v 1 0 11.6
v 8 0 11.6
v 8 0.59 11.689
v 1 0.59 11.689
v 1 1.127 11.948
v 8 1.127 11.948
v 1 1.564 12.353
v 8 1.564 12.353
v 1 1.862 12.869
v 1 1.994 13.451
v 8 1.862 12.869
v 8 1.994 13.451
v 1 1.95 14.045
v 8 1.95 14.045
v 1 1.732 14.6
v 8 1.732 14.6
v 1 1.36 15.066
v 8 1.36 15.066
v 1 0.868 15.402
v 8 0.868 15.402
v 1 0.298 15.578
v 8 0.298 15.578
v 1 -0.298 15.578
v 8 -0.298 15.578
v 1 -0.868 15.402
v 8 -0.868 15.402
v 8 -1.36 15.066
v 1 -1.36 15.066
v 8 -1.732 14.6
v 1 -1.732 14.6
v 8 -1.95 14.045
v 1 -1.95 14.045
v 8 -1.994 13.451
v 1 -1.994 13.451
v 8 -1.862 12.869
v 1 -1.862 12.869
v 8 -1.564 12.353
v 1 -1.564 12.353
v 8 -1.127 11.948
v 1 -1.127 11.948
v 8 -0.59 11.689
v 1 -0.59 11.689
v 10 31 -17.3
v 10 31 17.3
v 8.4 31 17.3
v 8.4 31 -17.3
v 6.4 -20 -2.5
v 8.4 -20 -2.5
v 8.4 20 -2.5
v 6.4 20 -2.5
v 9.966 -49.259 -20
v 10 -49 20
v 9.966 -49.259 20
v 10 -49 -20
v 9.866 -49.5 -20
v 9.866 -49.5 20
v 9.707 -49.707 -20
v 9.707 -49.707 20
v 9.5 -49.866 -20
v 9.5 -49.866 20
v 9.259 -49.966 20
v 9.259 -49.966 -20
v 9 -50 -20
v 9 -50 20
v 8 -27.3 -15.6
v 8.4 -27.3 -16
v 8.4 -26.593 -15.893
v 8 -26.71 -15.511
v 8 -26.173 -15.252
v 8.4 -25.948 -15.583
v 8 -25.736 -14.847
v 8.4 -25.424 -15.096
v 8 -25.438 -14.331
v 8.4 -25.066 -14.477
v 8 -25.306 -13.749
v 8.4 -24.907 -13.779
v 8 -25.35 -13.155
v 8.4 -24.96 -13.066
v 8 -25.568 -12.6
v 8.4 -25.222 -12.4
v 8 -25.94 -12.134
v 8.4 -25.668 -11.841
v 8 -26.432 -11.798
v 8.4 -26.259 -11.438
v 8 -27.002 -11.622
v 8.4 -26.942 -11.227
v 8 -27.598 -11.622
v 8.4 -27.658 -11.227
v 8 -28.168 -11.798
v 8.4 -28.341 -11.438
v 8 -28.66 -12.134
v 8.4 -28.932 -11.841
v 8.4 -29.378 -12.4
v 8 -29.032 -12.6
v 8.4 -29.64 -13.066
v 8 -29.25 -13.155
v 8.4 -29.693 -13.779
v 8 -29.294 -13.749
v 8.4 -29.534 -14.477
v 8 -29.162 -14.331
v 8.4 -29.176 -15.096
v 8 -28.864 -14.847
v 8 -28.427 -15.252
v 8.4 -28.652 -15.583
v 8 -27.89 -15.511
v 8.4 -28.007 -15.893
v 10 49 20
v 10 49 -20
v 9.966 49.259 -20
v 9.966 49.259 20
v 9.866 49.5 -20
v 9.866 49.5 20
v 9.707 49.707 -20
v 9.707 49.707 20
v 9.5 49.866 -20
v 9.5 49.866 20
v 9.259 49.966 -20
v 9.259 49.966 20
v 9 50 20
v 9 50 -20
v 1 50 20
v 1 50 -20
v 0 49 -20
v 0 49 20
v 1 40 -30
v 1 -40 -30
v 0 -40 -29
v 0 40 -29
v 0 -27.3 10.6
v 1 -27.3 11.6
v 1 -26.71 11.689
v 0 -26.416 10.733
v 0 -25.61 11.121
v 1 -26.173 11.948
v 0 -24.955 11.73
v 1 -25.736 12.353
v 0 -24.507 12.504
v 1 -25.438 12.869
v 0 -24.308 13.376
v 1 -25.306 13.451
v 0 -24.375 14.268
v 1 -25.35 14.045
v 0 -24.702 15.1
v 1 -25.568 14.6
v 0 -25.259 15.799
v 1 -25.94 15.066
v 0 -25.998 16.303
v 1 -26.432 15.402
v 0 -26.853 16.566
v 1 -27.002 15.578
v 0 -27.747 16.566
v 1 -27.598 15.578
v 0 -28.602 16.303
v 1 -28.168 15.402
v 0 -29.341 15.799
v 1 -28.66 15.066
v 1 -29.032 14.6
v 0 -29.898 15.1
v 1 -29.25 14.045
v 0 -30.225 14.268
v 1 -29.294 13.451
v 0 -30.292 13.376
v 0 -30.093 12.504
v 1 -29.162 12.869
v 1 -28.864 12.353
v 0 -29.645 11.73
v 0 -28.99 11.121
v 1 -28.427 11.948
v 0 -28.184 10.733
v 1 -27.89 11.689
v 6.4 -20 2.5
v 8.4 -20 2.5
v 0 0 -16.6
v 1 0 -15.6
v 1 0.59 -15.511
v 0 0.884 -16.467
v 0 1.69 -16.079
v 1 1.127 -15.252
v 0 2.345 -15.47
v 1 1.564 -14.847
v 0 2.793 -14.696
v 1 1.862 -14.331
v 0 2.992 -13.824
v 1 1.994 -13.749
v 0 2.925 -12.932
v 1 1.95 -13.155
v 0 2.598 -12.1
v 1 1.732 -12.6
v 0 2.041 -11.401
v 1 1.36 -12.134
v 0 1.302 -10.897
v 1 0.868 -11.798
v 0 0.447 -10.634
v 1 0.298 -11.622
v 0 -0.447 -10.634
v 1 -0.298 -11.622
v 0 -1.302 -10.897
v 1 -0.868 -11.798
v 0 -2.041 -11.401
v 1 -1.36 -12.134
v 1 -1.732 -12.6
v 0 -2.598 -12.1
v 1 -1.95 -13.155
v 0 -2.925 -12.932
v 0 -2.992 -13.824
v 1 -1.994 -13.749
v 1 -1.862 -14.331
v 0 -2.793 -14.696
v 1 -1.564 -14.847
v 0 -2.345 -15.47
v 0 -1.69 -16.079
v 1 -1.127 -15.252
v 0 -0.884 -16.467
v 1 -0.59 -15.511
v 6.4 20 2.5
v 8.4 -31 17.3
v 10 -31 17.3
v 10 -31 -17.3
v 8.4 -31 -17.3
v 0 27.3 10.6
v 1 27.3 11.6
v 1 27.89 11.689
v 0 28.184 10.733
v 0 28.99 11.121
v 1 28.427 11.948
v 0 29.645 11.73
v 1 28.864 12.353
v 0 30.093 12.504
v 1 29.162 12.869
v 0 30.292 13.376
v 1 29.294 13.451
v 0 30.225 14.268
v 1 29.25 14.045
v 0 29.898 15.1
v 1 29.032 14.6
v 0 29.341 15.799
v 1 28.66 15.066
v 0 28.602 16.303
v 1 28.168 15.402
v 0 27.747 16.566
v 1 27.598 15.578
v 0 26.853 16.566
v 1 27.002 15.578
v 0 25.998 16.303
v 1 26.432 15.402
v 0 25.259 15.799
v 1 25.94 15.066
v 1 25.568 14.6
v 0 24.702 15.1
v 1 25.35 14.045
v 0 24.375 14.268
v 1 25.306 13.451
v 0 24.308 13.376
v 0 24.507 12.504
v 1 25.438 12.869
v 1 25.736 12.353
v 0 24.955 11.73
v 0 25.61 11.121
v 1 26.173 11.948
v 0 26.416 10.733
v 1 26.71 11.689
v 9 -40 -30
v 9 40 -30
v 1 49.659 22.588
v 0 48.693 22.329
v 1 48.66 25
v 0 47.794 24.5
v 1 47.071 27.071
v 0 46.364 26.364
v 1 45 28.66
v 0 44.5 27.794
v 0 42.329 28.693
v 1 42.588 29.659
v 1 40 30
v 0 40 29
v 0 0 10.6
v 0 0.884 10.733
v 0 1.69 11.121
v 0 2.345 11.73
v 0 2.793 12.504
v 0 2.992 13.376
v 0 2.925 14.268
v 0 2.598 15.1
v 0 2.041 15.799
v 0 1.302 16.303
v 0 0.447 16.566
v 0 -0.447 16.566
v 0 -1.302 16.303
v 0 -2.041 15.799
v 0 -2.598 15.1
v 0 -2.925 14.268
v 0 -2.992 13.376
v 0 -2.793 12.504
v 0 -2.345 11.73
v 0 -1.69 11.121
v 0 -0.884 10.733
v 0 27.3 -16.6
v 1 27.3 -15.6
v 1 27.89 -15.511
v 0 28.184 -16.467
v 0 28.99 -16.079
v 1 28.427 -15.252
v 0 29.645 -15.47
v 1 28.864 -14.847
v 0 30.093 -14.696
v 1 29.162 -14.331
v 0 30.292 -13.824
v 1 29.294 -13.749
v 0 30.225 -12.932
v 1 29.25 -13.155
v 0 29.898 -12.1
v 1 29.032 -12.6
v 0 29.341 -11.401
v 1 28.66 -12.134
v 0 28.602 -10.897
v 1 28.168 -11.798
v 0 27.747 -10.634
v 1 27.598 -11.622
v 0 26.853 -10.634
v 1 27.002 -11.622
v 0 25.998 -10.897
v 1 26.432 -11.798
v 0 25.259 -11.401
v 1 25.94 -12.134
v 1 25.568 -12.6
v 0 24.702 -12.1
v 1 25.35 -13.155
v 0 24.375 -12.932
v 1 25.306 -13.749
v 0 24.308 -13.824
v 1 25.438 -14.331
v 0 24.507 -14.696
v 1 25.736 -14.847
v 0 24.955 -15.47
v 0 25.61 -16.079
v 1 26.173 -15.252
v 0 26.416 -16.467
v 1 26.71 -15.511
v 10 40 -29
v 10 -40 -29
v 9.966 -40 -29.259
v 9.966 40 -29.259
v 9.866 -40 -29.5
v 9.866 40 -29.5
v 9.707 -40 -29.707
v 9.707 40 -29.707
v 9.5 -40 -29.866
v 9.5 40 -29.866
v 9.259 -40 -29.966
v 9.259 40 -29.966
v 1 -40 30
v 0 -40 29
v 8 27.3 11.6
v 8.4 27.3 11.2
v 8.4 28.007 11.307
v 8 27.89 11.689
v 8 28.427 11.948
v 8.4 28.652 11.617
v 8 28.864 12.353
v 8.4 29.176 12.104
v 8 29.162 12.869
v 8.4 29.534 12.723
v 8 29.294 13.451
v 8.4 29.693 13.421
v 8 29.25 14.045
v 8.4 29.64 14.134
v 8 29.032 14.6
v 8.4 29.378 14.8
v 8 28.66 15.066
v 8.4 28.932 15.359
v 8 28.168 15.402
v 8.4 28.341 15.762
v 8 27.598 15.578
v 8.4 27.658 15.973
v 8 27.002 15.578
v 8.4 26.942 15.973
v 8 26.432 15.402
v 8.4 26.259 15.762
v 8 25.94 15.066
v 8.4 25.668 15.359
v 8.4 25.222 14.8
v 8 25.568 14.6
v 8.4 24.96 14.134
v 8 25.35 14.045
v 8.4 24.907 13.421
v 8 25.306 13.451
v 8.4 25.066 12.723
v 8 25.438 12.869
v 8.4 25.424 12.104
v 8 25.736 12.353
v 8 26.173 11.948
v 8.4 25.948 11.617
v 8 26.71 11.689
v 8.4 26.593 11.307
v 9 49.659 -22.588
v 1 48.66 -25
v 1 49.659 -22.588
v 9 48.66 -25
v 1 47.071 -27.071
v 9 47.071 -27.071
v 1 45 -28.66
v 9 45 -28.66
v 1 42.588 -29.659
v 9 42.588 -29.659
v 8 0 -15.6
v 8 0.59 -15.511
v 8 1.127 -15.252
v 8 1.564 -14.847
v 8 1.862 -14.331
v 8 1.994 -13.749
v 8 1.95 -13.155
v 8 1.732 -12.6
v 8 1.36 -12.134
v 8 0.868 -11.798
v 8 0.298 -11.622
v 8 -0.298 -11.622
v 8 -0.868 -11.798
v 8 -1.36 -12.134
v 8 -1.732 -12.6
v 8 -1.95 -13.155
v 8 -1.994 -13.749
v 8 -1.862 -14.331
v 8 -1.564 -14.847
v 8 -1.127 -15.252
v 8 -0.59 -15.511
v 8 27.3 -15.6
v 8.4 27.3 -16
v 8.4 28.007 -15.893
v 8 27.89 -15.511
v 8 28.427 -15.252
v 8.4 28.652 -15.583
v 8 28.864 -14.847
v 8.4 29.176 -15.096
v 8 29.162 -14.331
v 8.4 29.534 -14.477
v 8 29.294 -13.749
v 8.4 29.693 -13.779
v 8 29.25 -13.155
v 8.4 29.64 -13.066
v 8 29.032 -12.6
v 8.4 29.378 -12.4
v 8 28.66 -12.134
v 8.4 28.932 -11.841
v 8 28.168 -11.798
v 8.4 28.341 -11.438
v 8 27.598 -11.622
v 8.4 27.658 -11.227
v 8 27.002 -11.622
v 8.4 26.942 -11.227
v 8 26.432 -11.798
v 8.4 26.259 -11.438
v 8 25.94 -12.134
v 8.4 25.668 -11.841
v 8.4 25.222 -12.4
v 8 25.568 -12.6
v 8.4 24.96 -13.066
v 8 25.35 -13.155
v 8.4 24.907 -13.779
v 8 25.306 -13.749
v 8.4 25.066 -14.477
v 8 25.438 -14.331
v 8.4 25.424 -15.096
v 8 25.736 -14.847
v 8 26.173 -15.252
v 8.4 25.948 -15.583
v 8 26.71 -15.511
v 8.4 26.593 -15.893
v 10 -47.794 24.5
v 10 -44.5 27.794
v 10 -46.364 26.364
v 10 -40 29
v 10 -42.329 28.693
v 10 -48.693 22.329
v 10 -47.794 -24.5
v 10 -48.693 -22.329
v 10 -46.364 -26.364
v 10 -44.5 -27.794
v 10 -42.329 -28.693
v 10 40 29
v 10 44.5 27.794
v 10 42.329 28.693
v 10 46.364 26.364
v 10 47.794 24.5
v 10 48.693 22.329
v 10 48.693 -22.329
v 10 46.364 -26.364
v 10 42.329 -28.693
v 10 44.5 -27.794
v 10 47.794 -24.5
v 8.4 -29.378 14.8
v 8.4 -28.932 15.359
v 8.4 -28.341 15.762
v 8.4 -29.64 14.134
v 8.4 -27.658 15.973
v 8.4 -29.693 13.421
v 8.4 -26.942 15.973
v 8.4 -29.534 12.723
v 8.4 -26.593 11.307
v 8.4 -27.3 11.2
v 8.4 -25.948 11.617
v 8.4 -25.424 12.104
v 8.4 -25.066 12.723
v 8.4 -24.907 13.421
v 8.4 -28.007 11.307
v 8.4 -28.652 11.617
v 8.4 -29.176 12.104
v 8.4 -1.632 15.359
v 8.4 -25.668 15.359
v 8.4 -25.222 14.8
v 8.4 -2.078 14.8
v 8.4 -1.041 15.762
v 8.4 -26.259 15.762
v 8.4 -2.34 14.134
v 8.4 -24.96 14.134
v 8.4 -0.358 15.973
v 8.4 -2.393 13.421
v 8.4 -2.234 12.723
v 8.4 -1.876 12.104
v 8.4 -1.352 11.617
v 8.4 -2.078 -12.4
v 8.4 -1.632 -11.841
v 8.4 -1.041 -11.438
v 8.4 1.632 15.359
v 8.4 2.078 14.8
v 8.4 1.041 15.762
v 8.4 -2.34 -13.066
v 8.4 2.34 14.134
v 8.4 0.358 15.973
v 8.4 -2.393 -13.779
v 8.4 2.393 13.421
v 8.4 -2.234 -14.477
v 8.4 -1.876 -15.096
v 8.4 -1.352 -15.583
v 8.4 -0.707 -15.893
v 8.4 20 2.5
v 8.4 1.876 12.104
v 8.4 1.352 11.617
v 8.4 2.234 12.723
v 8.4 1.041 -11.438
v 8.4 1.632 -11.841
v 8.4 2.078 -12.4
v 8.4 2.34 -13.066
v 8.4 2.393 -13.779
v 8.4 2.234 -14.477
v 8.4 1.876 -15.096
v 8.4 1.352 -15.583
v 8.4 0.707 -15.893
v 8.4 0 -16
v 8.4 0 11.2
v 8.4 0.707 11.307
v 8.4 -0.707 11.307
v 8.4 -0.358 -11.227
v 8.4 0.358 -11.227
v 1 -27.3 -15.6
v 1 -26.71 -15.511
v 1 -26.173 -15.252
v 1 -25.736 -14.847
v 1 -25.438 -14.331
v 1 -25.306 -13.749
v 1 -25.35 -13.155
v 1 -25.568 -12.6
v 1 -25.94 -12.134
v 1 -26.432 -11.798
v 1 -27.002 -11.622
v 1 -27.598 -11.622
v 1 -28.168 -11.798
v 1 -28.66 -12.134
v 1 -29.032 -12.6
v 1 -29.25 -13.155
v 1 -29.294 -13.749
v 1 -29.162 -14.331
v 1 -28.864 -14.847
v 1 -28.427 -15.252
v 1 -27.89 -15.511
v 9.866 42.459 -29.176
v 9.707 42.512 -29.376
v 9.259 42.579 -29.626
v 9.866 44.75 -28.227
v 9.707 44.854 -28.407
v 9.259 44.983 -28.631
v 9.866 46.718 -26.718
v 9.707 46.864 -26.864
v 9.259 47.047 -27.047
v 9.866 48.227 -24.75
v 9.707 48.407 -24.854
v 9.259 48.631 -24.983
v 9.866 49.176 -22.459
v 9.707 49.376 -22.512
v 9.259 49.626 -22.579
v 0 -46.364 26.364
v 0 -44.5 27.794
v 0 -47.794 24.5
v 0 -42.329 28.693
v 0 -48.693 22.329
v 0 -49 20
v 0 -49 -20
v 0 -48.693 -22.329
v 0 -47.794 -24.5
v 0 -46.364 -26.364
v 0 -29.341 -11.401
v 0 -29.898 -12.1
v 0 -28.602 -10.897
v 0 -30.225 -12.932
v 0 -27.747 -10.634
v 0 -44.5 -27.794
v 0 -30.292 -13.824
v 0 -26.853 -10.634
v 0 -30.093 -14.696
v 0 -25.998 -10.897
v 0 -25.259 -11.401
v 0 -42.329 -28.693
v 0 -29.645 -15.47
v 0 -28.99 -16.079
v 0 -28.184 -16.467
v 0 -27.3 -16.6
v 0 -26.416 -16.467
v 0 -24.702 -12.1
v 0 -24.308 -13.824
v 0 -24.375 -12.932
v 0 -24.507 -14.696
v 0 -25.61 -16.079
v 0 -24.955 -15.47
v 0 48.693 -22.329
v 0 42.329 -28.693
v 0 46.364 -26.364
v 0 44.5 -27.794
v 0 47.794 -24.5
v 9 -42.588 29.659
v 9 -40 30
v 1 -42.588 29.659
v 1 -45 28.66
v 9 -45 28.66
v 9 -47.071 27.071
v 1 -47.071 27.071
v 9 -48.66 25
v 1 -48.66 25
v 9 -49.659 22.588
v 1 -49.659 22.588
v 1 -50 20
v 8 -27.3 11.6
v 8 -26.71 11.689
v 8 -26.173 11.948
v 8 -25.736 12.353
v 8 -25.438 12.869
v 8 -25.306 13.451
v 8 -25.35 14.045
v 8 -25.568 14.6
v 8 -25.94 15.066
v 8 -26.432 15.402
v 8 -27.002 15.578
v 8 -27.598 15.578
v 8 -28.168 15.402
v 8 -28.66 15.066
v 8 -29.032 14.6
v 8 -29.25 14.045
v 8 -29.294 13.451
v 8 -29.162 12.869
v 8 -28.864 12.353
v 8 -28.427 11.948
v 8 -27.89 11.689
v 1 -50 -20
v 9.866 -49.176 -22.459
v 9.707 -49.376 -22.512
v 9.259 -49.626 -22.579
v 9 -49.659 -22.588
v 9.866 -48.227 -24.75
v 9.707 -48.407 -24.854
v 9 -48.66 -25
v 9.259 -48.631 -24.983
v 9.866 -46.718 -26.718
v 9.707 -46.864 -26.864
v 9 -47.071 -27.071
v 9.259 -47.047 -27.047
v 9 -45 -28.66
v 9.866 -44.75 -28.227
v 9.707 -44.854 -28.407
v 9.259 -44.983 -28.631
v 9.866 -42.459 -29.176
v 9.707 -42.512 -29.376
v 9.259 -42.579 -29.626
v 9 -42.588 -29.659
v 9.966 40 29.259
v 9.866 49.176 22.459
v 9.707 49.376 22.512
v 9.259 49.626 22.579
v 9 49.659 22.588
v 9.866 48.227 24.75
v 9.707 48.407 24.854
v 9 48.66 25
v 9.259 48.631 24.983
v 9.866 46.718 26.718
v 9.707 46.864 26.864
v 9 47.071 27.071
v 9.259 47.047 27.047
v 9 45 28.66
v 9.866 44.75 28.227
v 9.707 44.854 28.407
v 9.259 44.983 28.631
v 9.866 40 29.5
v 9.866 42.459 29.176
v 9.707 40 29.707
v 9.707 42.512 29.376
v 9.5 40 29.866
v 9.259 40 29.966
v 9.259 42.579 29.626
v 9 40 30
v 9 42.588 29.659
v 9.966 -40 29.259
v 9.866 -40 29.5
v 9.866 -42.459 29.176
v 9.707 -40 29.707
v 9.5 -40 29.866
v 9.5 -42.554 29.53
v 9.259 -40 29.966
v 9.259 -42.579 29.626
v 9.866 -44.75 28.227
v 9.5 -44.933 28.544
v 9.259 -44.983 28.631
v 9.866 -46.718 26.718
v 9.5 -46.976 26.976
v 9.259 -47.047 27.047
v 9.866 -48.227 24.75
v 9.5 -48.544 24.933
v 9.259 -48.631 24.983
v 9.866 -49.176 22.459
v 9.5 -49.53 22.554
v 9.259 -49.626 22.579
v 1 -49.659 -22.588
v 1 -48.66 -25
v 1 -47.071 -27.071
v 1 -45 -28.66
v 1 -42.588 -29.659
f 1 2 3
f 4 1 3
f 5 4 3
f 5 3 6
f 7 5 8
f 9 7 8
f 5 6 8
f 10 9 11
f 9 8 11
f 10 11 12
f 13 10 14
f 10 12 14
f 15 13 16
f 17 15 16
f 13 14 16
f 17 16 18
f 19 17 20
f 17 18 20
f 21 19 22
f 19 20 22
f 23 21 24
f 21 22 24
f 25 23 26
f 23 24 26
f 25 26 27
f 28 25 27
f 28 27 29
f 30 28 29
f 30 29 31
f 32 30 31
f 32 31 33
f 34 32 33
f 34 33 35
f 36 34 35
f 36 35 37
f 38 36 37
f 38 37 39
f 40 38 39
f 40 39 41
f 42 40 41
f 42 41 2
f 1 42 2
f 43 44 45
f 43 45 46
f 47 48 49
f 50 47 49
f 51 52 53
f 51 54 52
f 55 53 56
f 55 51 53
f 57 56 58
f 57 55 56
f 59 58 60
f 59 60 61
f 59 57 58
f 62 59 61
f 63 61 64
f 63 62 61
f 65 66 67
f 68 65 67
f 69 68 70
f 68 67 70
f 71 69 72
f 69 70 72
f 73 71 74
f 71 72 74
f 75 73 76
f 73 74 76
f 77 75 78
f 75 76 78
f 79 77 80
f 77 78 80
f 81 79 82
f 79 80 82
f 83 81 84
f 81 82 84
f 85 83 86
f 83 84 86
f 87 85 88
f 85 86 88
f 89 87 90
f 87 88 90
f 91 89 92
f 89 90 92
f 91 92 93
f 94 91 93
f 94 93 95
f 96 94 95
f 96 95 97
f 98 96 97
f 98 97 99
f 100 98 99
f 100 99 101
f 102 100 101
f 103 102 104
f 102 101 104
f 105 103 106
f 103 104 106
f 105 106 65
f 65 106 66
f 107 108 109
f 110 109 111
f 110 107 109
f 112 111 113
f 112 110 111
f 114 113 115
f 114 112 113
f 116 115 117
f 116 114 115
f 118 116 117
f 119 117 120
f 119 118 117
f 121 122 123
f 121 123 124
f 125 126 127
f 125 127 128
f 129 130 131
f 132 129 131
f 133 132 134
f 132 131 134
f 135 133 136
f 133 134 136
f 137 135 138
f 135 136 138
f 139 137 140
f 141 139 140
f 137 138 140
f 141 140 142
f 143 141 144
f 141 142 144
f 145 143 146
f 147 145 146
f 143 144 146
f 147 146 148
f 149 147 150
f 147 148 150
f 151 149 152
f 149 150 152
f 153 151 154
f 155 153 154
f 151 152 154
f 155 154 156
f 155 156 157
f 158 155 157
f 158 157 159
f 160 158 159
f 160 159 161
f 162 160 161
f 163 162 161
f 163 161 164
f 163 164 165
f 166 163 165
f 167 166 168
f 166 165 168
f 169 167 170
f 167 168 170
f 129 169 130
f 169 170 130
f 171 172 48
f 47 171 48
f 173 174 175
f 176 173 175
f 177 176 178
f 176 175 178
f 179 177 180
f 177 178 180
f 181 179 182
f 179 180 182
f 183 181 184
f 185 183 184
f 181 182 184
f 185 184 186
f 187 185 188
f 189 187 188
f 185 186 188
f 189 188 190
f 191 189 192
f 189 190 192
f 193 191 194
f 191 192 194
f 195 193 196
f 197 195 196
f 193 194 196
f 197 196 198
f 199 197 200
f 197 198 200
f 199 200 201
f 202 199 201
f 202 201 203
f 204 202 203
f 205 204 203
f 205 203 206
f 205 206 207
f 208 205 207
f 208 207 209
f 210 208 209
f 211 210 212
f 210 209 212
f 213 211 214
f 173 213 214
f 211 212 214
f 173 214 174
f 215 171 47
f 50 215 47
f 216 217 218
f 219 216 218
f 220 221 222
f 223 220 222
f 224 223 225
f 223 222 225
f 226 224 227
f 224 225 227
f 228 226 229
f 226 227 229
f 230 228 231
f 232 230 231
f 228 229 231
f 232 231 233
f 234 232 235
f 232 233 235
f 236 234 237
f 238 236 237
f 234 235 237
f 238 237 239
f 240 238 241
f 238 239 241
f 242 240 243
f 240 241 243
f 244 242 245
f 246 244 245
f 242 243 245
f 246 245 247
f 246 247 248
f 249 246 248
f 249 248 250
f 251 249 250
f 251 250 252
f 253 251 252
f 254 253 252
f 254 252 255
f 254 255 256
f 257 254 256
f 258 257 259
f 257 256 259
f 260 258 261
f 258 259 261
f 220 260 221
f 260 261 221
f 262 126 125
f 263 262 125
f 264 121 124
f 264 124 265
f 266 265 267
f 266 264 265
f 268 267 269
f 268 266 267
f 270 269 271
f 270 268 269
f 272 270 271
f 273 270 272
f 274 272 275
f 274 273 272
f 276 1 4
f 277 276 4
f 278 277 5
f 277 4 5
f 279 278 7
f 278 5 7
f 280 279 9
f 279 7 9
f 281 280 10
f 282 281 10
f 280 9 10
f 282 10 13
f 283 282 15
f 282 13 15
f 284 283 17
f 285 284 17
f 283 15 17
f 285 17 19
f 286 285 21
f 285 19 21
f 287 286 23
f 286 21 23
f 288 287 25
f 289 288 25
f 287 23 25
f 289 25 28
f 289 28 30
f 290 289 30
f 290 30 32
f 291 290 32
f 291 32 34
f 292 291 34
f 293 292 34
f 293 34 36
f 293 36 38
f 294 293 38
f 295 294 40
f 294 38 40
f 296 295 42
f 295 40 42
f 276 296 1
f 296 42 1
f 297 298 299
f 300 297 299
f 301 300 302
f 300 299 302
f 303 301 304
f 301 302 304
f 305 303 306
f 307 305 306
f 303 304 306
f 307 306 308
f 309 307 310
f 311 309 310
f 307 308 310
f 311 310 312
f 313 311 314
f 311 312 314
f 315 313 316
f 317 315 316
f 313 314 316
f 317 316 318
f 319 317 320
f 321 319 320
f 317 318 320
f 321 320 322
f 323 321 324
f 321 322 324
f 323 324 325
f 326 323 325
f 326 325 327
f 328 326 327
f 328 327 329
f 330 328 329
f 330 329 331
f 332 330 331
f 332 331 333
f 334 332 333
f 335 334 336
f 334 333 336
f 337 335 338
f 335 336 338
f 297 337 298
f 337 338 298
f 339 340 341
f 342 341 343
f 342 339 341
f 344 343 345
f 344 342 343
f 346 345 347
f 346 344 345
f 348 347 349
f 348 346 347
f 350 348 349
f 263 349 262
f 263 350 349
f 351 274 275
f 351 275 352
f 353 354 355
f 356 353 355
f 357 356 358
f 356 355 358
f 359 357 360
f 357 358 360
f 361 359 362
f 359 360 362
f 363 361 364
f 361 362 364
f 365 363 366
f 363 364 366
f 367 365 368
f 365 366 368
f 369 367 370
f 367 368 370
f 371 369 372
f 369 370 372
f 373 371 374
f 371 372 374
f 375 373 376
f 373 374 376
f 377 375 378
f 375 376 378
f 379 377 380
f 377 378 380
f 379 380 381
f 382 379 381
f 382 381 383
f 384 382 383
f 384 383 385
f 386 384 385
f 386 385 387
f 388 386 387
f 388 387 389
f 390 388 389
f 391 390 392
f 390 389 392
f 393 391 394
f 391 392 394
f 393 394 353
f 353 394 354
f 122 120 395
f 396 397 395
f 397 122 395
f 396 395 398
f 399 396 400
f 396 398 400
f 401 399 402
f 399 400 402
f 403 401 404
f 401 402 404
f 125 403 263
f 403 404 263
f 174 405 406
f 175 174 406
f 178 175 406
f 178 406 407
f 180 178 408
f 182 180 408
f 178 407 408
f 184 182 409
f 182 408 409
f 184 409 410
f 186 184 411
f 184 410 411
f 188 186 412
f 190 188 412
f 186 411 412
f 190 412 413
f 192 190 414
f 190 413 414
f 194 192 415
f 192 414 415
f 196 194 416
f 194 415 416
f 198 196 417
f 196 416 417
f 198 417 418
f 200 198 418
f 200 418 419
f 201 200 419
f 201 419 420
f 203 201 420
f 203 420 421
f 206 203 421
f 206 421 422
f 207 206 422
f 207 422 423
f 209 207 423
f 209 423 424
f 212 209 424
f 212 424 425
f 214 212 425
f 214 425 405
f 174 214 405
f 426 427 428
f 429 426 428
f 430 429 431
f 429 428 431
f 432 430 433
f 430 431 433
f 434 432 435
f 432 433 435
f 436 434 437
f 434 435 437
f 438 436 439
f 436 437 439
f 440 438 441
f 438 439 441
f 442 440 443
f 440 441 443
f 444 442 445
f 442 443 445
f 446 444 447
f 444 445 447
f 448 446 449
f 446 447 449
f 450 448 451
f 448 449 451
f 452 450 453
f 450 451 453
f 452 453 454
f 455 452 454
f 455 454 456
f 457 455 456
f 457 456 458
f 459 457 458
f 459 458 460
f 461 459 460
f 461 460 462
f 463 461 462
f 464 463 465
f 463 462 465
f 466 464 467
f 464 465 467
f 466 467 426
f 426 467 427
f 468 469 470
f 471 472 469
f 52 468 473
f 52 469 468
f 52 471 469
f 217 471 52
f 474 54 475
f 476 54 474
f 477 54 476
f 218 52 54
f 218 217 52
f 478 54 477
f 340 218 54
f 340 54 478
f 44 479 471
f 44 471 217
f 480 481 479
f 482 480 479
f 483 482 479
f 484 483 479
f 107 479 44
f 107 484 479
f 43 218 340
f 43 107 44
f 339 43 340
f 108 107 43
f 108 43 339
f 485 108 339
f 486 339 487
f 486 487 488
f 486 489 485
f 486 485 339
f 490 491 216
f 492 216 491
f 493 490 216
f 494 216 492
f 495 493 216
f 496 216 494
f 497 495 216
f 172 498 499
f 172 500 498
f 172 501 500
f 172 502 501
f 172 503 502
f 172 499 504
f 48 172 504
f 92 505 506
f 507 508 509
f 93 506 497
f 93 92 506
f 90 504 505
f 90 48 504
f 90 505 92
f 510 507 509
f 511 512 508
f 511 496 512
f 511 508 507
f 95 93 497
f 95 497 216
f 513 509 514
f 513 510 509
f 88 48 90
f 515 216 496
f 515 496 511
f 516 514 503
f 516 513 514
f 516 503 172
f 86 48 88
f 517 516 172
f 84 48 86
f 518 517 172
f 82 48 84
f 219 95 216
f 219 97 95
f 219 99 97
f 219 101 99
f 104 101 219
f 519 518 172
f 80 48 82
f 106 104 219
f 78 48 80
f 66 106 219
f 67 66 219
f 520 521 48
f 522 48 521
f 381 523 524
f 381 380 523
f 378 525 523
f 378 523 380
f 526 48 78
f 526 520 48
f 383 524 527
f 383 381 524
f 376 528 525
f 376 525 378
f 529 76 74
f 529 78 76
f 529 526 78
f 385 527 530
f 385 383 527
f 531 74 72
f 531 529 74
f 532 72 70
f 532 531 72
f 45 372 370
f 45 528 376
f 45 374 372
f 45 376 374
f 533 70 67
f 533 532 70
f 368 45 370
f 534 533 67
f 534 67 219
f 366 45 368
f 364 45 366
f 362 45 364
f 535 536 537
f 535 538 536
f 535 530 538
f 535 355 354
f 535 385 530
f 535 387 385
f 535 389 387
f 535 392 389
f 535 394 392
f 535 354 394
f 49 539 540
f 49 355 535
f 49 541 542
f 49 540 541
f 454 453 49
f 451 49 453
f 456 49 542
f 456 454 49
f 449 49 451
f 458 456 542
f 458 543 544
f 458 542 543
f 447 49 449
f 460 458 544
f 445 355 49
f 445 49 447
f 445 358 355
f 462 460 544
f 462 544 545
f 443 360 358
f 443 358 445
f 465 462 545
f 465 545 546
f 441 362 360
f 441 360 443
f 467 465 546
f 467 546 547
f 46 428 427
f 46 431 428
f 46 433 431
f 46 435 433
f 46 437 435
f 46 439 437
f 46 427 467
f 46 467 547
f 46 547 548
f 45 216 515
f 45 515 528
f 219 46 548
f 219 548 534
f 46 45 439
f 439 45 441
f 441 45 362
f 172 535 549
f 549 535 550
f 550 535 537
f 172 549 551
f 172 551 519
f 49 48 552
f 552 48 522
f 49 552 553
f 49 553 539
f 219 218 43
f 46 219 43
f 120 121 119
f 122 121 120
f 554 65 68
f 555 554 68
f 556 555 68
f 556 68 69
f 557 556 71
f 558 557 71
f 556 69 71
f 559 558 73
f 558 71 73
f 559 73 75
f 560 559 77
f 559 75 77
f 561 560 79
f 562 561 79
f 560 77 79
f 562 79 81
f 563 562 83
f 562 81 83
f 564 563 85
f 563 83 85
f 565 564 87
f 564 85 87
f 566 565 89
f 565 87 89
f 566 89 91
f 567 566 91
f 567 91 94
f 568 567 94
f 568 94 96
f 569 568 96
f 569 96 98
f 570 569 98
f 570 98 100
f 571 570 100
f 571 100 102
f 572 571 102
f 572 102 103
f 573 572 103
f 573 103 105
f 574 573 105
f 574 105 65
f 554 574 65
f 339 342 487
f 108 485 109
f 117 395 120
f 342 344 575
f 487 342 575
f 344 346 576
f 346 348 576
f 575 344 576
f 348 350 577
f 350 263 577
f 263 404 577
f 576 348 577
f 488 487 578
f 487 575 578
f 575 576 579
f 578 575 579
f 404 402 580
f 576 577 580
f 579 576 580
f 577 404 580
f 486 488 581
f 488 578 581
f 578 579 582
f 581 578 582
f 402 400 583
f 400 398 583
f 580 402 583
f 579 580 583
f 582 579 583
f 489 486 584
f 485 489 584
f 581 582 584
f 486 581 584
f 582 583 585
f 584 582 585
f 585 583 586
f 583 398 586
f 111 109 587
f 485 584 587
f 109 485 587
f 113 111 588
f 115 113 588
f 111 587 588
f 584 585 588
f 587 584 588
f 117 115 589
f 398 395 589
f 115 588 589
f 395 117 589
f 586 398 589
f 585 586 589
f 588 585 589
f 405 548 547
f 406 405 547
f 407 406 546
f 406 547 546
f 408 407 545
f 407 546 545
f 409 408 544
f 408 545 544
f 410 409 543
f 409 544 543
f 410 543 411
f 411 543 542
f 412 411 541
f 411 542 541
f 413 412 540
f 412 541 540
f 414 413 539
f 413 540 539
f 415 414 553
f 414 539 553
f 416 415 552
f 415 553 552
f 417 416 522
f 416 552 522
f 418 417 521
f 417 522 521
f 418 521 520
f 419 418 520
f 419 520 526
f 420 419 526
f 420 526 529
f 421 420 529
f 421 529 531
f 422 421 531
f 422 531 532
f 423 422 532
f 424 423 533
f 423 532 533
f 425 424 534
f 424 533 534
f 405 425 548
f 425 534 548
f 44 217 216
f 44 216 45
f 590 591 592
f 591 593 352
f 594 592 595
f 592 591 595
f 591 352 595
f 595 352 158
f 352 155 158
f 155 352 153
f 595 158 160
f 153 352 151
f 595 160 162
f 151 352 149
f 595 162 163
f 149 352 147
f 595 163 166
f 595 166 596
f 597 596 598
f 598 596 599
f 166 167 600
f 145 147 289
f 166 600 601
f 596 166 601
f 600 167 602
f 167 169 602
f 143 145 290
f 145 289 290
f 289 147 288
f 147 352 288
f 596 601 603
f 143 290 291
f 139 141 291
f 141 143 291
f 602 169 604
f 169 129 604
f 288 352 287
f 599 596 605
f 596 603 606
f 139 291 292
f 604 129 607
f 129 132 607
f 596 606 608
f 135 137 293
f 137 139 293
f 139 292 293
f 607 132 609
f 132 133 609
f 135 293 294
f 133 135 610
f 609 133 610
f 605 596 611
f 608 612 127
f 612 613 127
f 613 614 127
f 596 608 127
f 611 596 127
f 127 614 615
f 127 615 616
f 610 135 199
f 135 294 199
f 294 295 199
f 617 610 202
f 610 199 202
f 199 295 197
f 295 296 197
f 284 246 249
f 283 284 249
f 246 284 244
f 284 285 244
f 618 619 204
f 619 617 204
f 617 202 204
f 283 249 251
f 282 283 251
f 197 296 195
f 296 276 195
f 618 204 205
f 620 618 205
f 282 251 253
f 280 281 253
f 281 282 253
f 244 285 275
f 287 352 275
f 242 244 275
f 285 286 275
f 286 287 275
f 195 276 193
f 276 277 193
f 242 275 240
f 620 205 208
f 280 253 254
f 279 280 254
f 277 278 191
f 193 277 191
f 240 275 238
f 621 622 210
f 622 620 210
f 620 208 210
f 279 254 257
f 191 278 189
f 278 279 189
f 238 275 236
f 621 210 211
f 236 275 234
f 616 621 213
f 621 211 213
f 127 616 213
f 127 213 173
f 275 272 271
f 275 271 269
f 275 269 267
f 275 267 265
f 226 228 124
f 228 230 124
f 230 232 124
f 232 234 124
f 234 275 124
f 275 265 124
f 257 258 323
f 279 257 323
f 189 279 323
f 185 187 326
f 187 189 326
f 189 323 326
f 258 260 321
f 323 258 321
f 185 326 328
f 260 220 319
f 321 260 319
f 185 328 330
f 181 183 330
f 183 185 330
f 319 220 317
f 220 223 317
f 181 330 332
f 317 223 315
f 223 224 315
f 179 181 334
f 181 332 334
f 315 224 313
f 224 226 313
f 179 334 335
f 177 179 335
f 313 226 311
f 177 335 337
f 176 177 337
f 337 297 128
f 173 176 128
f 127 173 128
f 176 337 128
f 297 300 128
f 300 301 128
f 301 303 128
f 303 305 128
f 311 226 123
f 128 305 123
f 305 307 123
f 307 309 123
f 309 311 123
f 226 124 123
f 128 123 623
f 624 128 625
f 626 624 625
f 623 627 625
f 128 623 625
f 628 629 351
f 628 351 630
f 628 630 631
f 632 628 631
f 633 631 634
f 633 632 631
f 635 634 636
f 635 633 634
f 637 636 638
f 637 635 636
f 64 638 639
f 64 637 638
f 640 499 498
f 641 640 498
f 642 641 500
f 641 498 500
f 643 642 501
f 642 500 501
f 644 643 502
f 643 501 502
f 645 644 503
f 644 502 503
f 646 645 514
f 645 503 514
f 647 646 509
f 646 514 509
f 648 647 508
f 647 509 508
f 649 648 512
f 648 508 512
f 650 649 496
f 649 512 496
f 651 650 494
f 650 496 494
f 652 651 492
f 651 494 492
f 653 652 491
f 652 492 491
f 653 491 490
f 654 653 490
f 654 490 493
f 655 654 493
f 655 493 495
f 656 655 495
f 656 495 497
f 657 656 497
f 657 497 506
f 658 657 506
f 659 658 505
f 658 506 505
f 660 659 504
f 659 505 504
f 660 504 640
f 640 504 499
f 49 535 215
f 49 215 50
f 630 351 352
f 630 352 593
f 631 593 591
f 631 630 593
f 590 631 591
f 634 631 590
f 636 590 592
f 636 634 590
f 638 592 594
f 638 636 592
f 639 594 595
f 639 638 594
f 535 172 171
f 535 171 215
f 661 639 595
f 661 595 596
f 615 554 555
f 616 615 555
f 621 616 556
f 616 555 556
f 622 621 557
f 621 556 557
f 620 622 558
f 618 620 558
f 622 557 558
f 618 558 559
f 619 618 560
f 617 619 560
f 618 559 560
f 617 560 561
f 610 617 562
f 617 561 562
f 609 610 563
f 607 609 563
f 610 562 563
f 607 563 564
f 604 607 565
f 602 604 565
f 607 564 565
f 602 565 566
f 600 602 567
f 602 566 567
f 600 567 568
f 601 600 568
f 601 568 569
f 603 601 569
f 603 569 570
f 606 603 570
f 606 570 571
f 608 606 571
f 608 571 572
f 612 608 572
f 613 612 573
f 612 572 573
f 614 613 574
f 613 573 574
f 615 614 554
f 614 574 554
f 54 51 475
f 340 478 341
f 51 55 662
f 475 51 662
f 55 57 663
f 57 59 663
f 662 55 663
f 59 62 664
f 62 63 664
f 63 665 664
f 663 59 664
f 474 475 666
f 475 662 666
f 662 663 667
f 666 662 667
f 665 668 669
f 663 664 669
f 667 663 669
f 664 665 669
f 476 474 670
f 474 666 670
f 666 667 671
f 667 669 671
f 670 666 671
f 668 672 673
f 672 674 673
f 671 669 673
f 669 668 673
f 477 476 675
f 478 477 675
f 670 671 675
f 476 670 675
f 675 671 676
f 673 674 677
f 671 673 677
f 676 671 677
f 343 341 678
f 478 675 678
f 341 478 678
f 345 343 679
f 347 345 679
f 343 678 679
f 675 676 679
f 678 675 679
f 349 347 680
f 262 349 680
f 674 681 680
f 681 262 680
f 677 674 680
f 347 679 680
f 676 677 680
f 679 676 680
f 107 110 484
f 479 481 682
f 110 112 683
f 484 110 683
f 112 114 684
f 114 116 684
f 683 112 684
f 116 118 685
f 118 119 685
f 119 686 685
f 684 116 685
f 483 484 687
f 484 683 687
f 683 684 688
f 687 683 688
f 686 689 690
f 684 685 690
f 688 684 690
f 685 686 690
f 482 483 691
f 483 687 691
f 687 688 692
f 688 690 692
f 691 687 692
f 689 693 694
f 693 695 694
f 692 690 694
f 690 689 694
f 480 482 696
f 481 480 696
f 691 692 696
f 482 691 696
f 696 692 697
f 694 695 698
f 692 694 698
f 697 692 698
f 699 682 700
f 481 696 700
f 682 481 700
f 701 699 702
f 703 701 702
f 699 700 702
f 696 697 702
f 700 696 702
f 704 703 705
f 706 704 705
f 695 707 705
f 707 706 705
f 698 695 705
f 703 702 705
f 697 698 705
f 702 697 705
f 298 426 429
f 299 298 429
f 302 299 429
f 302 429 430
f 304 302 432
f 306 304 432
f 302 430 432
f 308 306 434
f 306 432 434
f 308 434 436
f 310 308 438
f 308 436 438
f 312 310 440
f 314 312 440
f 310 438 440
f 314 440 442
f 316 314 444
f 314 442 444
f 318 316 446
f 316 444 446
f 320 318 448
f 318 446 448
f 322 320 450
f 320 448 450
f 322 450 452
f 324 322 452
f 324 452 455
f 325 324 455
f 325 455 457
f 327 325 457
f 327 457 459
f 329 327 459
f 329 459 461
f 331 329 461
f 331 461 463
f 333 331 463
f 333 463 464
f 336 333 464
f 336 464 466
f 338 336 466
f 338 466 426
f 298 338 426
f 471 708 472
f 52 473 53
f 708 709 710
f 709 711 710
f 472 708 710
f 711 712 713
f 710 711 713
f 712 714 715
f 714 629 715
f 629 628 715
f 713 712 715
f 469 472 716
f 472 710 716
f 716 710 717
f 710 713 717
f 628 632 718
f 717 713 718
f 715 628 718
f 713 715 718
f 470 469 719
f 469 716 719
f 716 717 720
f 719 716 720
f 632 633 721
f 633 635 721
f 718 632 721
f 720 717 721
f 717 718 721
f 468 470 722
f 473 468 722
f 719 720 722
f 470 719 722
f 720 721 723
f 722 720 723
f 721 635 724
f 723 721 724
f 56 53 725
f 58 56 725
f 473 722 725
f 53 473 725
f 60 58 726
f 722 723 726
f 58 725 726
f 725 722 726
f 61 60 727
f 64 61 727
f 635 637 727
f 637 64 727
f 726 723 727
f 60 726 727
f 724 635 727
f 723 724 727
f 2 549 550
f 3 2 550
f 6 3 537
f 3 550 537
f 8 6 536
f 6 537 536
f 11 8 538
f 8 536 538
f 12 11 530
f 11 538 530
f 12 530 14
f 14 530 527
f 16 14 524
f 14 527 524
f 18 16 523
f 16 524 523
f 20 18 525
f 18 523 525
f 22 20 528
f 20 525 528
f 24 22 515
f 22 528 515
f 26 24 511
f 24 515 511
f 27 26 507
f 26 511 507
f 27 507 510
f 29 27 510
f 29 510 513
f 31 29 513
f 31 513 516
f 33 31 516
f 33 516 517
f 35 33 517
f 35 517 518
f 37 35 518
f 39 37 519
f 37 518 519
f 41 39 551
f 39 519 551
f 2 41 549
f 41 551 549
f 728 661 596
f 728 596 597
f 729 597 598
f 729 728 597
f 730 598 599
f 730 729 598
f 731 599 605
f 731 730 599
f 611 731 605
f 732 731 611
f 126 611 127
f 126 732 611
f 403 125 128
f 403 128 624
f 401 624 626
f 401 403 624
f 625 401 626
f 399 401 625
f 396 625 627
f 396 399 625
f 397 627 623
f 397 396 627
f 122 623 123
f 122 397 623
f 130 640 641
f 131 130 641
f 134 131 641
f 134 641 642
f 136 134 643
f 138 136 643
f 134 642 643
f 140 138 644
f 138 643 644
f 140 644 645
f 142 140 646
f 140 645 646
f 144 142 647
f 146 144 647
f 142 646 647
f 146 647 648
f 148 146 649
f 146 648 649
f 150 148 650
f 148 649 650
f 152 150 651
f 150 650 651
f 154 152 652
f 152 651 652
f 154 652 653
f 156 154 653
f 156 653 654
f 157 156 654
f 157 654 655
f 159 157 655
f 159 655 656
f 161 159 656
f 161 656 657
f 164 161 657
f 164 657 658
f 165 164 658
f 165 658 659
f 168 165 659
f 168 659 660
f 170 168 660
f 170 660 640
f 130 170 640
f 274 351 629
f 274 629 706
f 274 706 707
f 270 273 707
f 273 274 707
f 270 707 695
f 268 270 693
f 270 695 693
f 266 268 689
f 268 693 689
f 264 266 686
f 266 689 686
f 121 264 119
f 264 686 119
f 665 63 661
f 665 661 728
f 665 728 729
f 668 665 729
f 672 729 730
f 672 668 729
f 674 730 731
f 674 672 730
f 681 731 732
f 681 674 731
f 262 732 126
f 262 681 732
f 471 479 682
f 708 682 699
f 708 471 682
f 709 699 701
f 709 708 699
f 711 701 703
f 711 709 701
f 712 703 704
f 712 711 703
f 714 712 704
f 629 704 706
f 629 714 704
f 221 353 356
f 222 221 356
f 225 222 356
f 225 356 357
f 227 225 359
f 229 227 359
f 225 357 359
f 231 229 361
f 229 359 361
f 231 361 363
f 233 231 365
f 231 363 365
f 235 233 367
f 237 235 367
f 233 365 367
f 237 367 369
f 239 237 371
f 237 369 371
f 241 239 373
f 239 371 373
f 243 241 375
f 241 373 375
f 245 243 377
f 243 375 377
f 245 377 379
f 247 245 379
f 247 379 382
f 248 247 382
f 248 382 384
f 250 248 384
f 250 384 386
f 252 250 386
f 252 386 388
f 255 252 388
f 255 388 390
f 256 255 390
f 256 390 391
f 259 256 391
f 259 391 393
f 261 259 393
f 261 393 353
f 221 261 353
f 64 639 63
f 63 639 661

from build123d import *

# Parameters (mm, degrees)
SKETCH1_W           = 60
SKETCH1_H           = 100
BOSS_EXTRUDE1_DEPTH = 10
SKETCH2_W           = 34.6
SKETCH2_H           = 62
CUT_EXTRUDE1_DEPTH  = 1.6
SKETCH3_R           = 2
CUT_EXTRUDE2_DEPTH  = 59.911458987
FILLET1_R           = 10
FILLET2_R           = 1
CHAMFER1_SIZE       = 1
CHAMFER2_SIZE       = 0.4
SKETCH4_W           = 5
SKETCH4_H           = 40
CUT_EXTRUDE3_DEPTH  = 2


with BuildPart() as part:
    # Sketch1 → Boss-Extrude1 (new body)
    with BuildSketch(Plane(origin=(0, 0, 0), x_dir=(0, 0, -1), z_dir=(1, 0, 0))):
        Rectangle(SKETCH1_W, SKETCH1_H)
    extrude(amount=BOSS_EXTRUDE1_DEPTH)

    # Sketch2 → Cut-Extrude1 (cut)
    with BuildSketch(Plane(origin=(10, 0, 0), x_dir=(0, 0, -1), z_dir=(1, 0, 0))):
        Rectangle(SKETCH2_W, SKETCH2_H)
    extrude(amount=-CUT_EXTRUDE1_DEPTH, mode=Mode.SUBTRACT)

    # Sketch3 → Cut-Extrude2 (cut, through all)
    with BuildSketch(Plane(origin=(8.4, 0, 0), x_dir=(0, 0, -1), z_dir=(1, 0, 0))):
        with Locations((-13.6, 27.3)):
            Circle(SKETCH3_R)
        with Locations((13.6, 27.3)):
            Circle(SKETCH3_R)
        with Locations((-13.6, 0)):
            Circle(SKETCH3_R)
        with Locations((13.6, 0)):
            Circle(SKETCH3_R)
        with Locations((-13.6, -27.3)):
            Circle(SKETCH3_R)
        with Locations((13.6, -27.3)):
            Circle(SKETCH3_R)
    extrude(amount=-CUT_EXTRUDE2_DEPTH, mode=Mode.SUBTRACT)

    # Fillet1
    fillet1_edges = [part.edges().sort_by_distance(p)[0] for p in [
        (5, -50, -30),
        (5, -50, 30),
        (5, 50, 30),
        (5, 50, -30),
    ]]
    fillet(fillet1_edges, radius=FILLET1_R)

    # Fillet2
    fillet2_edges = [part.edges().sort_by_distance(p)[0] for p in [
        (10, -50, 0),
        (10, 0, 30),
        (10, 0, -30),
        (10, 50, 0),
        (10, -47.071067812, -27.071067812),
        (10, 47.071067812, -27.071067812),
        (10, 47.071067812, 27.071067812),
        (10, -47.071067812, 27.071067812),
    ]]
    fillet(fillet2_edges, radius=FILLET2_R)

    # Chamfer1
    chamfer1_edges = [part.edges().sort_by_distance(p)[0] for p in [
        (0, -27.3, 15.6),
        (0, 0, -11.6),
        (0, 0, 15.6),
        (0, 27.3, -11.6),
        (0, -27.3, -11.6),
        (0, 27.3, 15.6),
        (0, -50, 0),
        (0, 0, -30),
        (0, 0, 30),
        (0, 50, 0),
        (0, -47.071067812, -27.071067812),
        (0, 47.071067812, -27.071067812),
        (0, 47.071067812, 27.071067812),
        (0, -47.071067812, 27.071067812),
    ]]
    chamfer(chamfer1_edges, length=CHAMFER1_SIZE)

    # Chamfer2
    chamfer2_edges = [part.edges().sort_by_distance(p)[0] for p in [
        (8.4, -27.3, 15.6),
        (8.4, 0, -11.6),
        (8.4, 0, 15.6),
        (8.4, 27.3, -11.6),
        (8.4, -27.3, -11.6),
        (8.4, 27.3, 15.6),
    ]]
    chamfer(chamfer2_edges, length=CHAMFER2_SIZE)

    # Sketch4 → Cut-Extrude3 (cut)
    with BuildSketch(Plane(origin=(8.4, 0, 0), x_dir=(0, 0, -1), z_dir=(1, 0, 0))):
        Rectangle(SKETCH4_W, SKETCH4_H)
    extrude(amount=-CUT_EXTRUDE3_DEPTH, mode=Mode.SUBTRACT)


solid = part.part
